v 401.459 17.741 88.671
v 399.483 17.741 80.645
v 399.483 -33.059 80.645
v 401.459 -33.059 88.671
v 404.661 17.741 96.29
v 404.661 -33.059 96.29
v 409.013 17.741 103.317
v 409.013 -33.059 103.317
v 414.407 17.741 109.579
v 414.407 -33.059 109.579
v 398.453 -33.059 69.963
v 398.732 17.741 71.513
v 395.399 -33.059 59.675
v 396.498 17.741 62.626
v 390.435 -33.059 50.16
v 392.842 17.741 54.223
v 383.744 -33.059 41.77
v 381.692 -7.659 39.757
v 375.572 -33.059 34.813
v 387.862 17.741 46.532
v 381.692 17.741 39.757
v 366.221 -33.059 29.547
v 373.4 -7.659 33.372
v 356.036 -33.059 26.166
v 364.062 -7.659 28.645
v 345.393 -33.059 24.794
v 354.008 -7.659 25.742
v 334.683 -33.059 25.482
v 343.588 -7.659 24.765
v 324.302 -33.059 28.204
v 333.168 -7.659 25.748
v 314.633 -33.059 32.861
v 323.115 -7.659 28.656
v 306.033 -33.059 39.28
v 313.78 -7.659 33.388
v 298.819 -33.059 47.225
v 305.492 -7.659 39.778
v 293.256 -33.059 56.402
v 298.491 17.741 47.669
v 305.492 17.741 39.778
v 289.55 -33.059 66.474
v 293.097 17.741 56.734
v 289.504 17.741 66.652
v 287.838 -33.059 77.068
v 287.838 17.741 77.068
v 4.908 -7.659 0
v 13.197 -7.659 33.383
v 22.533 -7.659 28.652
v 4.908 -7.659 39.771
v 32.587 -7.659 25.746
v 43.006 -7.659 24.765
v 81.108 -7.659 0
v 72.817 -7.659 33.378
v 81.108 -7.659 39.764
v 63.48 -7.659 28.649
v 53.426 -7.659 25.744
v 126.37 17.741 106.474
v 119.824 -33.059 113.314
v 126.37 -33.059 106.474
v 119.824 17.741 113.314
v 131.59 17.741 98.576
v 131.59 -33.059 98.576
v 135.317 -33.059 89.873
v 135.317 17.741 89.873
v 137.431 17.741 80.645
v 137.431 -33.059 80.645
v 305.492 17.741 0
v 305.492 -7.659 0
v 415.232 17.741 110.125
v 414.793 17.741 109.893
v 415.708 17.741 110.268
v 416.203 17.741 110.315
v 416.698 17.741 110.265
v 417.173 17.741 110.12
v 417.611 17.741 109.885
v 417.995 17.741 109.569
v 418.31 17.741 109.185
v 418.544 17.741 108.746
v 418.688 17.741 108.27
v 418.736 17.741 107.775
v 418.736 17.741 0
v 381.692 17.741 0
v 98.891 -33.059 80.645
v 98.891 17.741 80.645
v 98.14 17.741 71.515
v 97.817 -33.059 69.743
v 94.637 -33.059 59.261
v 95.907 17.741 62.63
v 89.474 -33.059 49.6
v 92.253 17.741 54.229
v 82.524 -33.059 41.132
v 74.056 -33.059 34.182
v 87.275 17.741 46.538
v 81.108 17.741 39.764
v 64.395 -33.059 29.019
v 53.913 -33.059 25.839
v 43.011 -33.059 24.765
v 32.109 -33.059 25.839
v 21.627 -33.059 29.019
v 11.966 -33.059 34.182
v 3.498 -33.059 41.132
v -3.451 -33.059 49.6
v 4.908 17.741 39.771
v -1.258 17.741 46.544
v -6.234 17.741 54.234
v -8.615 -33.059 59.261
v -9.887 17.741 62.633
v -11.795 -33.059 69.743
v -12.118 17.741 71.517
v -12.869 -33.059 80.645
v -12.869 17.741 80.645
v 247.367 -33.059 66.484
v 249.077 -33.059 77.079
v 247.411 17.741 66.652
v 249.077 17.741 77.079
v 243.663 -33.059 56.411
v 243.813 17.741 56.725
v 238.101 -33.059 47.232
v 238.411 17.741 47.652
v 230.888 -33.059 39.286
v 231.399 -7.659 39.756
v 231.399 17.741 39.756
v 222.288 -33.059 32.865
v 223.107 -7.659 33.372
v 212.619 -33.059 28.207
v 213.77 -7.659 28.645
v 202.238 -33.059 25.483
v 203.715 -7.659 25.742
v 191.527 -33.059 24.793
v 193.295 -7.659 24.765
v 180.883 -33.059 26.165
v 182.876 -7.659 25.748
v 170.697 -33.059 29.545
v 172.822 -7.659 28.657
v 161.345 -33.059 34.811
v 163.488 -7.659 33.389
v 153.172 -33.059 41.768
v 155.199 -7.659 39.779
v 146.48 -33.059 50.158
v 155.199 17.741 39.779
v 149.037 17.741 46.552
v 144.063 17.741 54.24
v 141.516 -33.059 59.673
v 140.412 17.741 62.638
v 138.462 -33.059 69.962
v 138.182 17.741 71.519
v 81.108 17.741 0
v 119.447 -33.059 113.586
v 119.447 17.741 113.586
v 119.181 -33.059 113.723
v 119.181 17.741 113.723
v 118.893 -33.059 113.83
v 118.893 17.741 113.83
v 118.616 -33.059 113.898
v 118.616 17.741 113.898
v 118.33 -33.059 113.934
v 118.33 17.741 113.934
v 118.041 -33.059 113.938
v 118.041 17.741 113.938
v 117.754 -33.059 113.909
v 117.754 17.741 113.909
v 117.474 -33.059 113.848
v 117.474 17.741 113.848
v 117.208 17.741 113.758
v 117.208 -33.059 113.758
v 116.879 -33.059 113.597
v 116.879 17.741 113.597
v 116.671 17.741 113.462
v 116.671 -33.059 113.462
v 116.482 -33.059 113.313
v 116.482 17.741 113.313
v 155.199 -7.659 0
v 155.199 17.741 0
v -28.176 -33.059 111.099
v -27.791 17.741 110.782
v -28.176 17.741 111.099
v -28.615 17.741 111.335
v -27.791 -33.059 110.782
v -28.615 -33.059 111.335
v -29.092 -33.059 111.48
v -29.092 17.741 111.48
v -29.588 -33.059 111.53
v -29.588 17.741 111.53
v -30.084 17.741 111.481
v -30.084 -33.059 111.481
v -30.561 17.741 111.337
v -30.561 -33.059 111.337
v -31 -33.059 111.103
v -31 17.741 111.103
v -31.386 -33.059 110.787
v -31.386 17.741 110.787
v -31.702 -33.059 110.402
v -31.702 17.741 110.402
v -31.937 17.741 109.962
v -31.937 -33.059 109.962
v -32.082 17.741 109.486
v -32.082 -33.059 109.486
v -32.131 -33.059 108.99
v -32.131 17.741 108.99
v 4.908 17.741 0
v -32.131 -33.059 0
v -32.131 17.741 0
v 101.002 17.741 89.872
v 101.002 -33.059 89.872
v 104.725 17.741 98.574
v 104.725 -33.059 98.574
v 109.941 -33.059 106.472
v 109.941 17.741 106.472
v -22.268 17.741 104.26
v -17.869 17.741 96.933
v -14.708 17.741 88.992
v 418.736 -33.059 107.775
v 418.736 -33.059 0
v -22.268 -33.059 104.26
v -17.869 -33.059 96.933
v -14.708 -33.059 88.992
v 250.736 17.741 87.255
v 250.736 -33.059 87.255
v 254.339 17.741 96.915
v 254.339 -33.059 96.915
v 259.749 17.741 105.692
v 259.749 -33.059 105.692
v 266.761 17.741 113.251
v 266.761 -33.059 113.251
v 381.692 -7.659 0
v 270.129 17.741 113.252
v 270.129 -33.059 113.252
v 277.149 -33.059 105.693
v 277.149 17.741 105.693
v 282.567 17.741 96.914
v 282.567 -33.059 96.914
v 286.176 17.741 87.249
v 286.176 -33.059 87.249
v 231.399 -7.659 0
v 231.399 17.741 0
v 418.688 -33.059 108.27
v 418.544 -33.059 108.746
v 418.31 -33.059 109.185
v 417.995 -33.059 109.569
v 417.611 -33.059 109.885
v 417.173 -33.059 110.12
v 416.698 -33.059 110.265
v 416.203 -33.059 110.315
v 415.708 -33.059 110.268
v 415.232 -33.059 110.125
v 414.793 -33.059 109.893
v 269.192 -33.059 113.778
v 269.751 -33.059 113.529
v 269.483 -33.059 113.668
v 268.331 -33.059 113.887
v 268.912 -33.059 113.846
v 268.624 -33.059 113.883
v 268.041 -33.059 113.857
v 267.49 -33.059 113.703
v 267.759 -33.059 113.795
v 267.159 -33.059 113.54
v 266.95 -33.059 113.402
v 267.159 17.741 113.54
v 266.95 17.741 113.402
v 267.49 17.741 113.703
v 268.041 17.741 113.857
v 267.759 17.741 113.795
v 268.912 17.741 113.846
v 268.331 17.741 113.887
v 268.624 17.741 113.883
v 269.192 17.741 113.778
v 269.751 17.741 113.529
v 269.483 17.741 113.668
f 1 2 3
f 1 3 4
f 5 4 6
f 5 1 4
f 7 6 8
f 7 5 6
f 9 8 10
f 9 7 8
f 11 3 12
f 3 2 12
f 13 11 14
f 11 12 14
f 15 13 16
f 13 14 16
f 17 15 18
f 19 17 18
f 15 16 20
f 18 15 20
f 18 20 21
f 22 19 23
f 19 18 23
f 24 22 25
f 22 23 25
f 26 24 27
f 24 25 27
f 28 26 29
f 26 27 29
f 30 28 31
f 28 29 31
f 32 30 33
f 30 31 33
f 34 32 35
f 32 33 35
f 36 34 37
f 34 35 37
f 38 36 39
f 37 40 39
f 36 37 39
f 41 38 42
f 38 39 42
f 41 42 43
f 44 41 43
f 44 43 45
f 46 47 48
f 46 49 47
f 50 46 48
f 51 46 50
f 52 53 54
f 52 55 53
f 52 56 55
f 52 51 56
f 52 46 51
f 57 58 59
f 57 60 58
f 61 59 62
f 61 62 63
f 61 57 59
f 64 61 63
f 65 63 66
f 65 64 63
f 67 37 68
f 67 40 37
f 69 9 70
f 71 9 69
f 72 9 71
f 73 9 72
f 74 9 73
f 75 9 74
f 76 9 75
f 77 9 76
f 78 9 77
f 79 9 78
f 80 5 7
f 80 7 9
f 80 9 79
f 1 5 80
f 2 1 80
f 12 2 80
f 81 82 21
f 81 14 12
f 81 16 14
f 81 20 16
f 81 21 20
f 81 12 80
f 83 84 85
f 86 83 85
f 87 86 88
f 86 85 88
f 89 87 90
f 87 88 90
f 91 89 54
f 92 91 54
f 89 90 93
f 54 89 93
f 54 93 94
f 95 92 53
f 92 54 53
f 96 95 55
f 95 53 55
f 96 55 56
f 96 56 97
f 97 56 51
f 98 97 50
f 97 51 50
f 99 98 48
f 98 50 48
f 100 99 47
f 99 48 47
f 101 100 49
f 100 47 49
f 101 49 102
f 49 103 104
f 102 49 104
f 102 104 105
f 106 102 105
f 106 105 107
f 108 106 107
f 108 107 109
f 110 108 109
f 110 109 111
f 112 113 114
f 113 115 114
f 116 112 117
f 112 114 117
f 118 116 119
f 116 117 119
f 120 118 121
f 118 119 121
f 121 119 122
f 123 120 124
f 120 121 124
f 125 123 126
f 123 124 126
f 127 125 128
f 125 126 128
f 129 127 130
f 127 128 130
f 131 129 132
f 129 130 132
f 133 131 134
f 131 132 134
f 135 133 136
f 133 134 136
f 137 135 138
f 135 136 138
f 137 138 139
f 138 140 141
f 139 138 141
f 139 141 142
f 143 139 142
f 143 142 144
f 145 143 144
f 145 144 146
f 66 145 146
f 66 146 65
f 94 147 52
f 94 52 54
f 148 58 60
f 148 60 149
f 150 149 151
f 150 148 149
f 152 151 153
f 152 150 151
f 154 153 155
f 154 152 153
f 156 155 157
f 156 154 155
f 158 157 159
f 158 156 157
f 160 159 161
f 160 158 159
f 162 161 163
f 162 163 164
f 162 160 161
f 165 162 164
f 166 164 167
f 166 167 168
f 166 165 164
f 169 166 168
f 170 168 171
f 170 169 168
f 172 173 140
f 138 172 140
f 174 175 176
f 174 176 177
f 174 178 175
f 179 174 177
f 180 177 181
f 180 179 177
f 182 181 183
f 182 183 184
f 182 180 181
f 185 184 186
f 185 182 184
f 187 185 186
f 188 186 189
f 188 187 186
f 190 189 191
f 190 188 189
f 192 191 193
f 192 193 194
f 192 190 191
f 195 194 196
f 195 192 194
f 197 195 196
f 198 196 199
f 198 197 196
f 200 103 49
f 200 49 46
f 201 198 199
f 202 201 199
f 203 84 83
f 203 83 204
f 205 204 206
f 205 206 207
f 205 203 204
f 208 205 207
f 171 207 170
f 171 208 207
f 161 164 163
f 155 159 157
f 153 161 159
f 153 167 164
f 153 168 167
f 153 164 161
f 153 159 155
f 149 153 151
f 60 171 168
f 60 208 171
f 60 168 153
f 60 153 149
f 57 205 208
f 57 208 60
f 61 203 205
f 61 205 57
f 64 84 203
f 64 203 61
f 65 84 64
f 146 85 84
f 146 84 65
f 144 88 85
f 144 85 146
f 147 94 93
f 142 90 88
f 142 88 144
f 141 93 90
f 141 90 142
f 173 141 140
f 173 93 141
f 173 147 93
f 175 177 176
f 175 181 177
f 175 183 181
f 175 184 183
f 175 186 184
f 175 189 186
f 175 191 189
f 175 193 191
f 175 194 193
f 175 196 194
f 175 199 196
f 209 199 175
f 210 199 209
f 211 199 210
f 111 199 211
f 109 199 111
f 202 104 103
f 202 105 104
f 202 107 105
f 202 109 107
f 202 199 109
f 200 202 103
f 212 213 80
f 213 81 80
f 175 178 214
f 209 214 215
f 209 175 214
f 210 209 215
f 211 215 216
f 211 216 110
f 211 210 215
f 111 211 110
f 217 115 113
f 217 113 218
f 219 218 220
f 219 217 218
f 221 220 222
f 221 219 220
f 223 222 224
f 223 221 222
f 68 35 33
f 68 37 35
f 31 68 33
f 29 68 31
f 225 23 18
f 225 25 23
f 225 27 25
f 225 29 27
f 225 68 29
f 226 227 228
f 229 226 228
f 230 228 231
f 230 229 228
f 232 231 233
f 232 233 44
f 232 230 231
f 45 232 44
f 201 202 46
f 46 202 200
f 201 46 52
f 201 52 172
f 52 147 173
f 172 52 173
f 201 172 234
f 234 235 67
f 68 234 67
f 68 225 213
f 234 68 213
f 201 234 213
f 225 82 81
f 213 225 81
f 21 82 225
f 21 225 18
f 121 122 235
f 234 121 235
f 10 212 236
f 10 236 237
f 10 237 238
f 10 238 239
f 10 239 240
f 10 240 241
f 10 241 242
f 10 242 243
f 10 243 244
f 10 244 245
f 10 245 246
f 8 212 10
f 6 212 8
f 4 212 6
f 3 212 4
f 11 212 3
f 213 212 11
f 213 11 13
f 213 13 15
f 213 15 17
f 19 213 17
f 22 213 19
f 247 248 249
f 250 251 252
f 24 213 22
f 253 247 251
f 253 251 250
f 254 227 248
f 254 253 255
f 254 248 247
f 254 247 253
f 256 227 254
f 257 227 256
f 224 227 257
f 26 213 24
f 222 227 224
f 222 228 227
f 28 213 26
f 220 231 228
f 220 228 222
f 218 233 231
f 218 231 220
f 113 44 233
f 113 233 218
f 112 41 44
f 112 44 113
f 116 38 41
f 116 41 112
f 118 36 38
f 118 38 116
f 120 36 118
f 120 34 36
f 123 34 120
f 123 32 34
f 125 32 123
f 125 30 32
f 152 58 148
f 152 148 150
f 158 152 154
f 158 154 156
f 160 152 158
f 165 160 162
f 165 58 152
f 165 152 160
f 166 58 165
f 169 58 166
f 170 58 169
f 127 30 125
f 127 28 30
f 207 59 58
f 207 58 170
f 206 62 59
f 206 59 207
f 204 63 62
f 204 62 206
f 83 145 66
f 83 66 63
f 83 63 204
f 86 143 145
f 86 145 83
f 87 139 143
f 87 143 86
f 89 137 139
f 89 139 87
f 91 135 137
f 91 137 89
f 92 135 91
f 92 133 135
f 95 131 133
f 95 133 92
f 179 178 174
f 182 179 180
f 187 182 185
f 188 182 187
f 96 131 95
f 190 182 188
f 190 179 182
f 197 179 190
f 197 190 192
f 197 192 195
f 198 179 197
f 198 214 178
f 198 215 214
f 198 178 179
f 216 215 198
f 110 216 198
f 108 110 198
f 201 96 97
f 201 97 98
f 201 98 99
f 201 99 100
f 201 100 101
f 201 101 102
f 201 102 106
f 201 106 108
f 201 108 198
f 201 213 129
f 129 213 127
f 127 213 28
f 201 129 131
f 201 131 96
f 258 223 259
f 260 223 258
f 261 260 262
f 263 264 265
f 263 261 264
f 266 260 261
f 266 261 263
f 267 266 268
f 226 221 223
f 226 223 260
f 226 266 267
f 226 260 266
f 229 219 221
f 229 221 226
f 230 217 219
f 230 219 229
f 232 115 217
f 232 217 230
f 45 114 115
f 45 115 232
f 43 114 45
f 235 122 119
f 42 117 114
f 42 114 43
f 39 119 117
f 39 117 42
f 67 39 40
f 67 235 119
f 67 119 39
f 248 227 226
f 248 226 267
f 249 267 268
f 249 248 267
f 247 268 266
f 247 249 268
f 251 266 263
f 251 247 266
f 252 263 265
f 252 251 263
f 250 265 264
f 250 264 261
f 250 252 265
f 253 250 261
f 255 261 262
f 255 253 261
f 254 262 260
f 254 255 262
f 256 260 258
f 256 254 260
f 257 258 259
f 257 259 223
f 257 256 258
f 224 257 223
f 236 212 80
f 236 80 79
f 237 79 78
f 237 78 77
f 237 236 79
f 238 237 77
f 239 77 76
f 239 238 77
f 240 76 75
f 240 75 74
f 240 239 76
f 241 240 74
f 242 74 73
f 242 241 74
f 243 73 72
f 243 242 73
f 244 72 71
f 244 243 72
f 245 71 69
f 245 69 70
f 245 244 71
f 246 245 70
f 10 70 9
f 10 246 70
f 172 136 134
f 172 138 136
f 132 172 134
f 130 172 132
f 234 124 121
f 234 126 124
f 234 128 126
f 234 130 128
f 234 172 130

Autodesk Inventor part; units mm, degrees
ref_plane "YZ Plane" through (0, 0, 0) normal (1, 0, 0) x (0, 1, 0)
ref_plane "XZ Plane" through (0, 0, 0) normal (0, 1, 0) x (-1, 0, 0)
ref_plane "XY Plane" through (0, 0, 0) normal (0, 0, 1) x (1, 0, 0)
sketch "Sketch1" plane through (0, 0, 0) normal (0, 0, 1) x (1, 0, 0)
  line L0 (-32.1306, 17.7406) -> (444.1194, 17.7406)
  line L1 (444.1194, 17.7406) -> (444.1194, -33.0594)
  line L2 (444.1194, -33.0594) -> (-32.1306, -33.0594)
  line L3 (-32.1306, -33.0594) -> (-32.1306, 17.7406)
  point P0 (0, 0)
  dimension "d0" = 476.25
  dimension "d1" = 50.8
extrude "Extrusion1" add sketch "Sketch1" along normal blind 139.7
sketch "Sketch2" plane through (-32.1306, 17.7406, 0) normal (0, 1, 0) x (1, 0, 0)
  line L0 (0, -139.7) -> (476.25, -139.7) projected
  line L1 (0, 0) -> (476.25, 0) projected
  line L2 (0, 0) -> (0, -139.7) projected
  circle A0 centre (75.1417, -80.645) radius 55.88
  circle A1 centre (225.4419, -80.645) radius 55.88
  circle A2 centre (375.7337, -80.645) radius 55.88
  line L3 (150.2833, 0) -> (150.2833, -139.7)
  line L4 (300.5751, 0) -> (300.5751, -139.7)
  line L5 (450.8669, 0) -> (450.8669, -139.7)
  arc A3 (131.0217, -80.645) -> (150.2833, -114.7129) centre (183.3802, -73.521) ccw
  arc A4 (150.2833, -114.7129) -> (169.5619, -80.645) centre (117.2054, -73.5058) ccw
  arc A5 (281.208, -77.0792) -> (300.5751, -114.6812) centre (333.9413, -73.7073) ccw
  arc A6 (300.5751, -114.6812) -> (319.9683, -77.068) centre (267.2357, -73.6855) ccw
  arc A7 (0, -114.6812) -> (19.2617, -80.645) centre (-33.0921, -73.4855) ccw
  arc A8 (431.6137, -80.645) -> (450.8669, -113.4262) centre (483.7537, -72.0665) ccw
  line L6 (450.8669, 0) -> (476.25, 0)
  line L7 (476.25, 0) -> (476.25, -139.7)
  line L8 (476.25, -139.7) -> (450.8669, -139.7)
  line L9 (450.8669, -139.7) -> (450.8669, 0)
  point P0 (32.1306, 0)
  dimension "d4" = 111.76
  dimension "d5" = 111.76
  dimension "d6" = 111.76
  dimension "d7" = 150.2833
  dimension "d8" = 150.2918
  dimension "d9" = 150.2918
  dimension "d10" = 75.1417
  dimension "d11" = 75.1332
  dimension "d12" = 75.1332
  dimension "d13" = 59.055
extrude "Extrusion2" cut sketch "Sketch2" against normal blind 139.7 contours L2 A7 A0 A3 L3 L0 | L3 A4 A1 A5 L4 L0 | L4 A6 A2 A8 L5 L0 | A0 | L5 L1 L7 L0 | A1 | A2
fillet "Fillet1" radius 2.54 1 edges at (418.7363, -7.6594, 113.4262)
fillet "Fillet2" radius 2.54 1 edges at (268.4445, -7.6594, 114.6812)
fillet "Fillet3" radius 2.54 1 edges at (118.1527, -7.6594, 114.7129)
fillet "Fillet4" radius 2.54 1 edges at (-32.1306, -7.6594, 114.6812)
sketch "Sketch3" plane through (-32.1306, 17.7406, 0) normal (0, 1, 0) x (1, 0, 0)
  arc A0 (148.6129, -113.313) -> (151.9544, -113.3138) centre (150.2841, -111.4003) ccw projected
  arc A1 (298.8914, -113.2506) -> (302.2598, -113.2517) centre (300.5762, -111.3498) ccw projected
  line L0 (0, 0) -> (450.8669, 0) projected
  line L1 (37.0382, 0) -> (113.2382, 0)
  line L2 (113.2382, 0) -> (113.2382, -50.8)
  line L3 (113.2382, -50.8) -> (37.0382, -50.8)
  line L4 (37.0382, -50.8) -> (37.0382, 0)
  line L5 (150.2841, -111.4003) -> (150.2841, 5.0811)
  line L6 (263.53, 0) -> (187.33, 0)
  line L7 (187.33, 0) -> (187.33, -50.8)
  line L8 (187.33, -50.8) -> (263.53, -50.8)
  line L9 (263.53, -50.8) -> (263.53, 0)
  line L10 (75.1382, -50.8) -> (75.1382, 0)
  line L11 (300.5762, -111.3498) -> (300.5762, 0)
  line L12 (337.6224, -50.8) -> (337.6224, 0)
  line L13 (337.6224, 0) -> (413.8224, 0)
  line L14 (413.8224, 0) -> (413.8224, -50.8)
  line L15 (413.8224, -50.8) -> (337.6224, -50.8)
  point P0 (32.1306, 0)
  dimension "d20" = 76.2
  dimension "d21" = 50.8
  dimension "d22" = 0
  dimension "d23" = 38.1
  dimension "d24" = 75.1459
extrude "Extrusion3" cut sketch "Sketch3" against normal blind 25.4
properties part number "swirvy"
